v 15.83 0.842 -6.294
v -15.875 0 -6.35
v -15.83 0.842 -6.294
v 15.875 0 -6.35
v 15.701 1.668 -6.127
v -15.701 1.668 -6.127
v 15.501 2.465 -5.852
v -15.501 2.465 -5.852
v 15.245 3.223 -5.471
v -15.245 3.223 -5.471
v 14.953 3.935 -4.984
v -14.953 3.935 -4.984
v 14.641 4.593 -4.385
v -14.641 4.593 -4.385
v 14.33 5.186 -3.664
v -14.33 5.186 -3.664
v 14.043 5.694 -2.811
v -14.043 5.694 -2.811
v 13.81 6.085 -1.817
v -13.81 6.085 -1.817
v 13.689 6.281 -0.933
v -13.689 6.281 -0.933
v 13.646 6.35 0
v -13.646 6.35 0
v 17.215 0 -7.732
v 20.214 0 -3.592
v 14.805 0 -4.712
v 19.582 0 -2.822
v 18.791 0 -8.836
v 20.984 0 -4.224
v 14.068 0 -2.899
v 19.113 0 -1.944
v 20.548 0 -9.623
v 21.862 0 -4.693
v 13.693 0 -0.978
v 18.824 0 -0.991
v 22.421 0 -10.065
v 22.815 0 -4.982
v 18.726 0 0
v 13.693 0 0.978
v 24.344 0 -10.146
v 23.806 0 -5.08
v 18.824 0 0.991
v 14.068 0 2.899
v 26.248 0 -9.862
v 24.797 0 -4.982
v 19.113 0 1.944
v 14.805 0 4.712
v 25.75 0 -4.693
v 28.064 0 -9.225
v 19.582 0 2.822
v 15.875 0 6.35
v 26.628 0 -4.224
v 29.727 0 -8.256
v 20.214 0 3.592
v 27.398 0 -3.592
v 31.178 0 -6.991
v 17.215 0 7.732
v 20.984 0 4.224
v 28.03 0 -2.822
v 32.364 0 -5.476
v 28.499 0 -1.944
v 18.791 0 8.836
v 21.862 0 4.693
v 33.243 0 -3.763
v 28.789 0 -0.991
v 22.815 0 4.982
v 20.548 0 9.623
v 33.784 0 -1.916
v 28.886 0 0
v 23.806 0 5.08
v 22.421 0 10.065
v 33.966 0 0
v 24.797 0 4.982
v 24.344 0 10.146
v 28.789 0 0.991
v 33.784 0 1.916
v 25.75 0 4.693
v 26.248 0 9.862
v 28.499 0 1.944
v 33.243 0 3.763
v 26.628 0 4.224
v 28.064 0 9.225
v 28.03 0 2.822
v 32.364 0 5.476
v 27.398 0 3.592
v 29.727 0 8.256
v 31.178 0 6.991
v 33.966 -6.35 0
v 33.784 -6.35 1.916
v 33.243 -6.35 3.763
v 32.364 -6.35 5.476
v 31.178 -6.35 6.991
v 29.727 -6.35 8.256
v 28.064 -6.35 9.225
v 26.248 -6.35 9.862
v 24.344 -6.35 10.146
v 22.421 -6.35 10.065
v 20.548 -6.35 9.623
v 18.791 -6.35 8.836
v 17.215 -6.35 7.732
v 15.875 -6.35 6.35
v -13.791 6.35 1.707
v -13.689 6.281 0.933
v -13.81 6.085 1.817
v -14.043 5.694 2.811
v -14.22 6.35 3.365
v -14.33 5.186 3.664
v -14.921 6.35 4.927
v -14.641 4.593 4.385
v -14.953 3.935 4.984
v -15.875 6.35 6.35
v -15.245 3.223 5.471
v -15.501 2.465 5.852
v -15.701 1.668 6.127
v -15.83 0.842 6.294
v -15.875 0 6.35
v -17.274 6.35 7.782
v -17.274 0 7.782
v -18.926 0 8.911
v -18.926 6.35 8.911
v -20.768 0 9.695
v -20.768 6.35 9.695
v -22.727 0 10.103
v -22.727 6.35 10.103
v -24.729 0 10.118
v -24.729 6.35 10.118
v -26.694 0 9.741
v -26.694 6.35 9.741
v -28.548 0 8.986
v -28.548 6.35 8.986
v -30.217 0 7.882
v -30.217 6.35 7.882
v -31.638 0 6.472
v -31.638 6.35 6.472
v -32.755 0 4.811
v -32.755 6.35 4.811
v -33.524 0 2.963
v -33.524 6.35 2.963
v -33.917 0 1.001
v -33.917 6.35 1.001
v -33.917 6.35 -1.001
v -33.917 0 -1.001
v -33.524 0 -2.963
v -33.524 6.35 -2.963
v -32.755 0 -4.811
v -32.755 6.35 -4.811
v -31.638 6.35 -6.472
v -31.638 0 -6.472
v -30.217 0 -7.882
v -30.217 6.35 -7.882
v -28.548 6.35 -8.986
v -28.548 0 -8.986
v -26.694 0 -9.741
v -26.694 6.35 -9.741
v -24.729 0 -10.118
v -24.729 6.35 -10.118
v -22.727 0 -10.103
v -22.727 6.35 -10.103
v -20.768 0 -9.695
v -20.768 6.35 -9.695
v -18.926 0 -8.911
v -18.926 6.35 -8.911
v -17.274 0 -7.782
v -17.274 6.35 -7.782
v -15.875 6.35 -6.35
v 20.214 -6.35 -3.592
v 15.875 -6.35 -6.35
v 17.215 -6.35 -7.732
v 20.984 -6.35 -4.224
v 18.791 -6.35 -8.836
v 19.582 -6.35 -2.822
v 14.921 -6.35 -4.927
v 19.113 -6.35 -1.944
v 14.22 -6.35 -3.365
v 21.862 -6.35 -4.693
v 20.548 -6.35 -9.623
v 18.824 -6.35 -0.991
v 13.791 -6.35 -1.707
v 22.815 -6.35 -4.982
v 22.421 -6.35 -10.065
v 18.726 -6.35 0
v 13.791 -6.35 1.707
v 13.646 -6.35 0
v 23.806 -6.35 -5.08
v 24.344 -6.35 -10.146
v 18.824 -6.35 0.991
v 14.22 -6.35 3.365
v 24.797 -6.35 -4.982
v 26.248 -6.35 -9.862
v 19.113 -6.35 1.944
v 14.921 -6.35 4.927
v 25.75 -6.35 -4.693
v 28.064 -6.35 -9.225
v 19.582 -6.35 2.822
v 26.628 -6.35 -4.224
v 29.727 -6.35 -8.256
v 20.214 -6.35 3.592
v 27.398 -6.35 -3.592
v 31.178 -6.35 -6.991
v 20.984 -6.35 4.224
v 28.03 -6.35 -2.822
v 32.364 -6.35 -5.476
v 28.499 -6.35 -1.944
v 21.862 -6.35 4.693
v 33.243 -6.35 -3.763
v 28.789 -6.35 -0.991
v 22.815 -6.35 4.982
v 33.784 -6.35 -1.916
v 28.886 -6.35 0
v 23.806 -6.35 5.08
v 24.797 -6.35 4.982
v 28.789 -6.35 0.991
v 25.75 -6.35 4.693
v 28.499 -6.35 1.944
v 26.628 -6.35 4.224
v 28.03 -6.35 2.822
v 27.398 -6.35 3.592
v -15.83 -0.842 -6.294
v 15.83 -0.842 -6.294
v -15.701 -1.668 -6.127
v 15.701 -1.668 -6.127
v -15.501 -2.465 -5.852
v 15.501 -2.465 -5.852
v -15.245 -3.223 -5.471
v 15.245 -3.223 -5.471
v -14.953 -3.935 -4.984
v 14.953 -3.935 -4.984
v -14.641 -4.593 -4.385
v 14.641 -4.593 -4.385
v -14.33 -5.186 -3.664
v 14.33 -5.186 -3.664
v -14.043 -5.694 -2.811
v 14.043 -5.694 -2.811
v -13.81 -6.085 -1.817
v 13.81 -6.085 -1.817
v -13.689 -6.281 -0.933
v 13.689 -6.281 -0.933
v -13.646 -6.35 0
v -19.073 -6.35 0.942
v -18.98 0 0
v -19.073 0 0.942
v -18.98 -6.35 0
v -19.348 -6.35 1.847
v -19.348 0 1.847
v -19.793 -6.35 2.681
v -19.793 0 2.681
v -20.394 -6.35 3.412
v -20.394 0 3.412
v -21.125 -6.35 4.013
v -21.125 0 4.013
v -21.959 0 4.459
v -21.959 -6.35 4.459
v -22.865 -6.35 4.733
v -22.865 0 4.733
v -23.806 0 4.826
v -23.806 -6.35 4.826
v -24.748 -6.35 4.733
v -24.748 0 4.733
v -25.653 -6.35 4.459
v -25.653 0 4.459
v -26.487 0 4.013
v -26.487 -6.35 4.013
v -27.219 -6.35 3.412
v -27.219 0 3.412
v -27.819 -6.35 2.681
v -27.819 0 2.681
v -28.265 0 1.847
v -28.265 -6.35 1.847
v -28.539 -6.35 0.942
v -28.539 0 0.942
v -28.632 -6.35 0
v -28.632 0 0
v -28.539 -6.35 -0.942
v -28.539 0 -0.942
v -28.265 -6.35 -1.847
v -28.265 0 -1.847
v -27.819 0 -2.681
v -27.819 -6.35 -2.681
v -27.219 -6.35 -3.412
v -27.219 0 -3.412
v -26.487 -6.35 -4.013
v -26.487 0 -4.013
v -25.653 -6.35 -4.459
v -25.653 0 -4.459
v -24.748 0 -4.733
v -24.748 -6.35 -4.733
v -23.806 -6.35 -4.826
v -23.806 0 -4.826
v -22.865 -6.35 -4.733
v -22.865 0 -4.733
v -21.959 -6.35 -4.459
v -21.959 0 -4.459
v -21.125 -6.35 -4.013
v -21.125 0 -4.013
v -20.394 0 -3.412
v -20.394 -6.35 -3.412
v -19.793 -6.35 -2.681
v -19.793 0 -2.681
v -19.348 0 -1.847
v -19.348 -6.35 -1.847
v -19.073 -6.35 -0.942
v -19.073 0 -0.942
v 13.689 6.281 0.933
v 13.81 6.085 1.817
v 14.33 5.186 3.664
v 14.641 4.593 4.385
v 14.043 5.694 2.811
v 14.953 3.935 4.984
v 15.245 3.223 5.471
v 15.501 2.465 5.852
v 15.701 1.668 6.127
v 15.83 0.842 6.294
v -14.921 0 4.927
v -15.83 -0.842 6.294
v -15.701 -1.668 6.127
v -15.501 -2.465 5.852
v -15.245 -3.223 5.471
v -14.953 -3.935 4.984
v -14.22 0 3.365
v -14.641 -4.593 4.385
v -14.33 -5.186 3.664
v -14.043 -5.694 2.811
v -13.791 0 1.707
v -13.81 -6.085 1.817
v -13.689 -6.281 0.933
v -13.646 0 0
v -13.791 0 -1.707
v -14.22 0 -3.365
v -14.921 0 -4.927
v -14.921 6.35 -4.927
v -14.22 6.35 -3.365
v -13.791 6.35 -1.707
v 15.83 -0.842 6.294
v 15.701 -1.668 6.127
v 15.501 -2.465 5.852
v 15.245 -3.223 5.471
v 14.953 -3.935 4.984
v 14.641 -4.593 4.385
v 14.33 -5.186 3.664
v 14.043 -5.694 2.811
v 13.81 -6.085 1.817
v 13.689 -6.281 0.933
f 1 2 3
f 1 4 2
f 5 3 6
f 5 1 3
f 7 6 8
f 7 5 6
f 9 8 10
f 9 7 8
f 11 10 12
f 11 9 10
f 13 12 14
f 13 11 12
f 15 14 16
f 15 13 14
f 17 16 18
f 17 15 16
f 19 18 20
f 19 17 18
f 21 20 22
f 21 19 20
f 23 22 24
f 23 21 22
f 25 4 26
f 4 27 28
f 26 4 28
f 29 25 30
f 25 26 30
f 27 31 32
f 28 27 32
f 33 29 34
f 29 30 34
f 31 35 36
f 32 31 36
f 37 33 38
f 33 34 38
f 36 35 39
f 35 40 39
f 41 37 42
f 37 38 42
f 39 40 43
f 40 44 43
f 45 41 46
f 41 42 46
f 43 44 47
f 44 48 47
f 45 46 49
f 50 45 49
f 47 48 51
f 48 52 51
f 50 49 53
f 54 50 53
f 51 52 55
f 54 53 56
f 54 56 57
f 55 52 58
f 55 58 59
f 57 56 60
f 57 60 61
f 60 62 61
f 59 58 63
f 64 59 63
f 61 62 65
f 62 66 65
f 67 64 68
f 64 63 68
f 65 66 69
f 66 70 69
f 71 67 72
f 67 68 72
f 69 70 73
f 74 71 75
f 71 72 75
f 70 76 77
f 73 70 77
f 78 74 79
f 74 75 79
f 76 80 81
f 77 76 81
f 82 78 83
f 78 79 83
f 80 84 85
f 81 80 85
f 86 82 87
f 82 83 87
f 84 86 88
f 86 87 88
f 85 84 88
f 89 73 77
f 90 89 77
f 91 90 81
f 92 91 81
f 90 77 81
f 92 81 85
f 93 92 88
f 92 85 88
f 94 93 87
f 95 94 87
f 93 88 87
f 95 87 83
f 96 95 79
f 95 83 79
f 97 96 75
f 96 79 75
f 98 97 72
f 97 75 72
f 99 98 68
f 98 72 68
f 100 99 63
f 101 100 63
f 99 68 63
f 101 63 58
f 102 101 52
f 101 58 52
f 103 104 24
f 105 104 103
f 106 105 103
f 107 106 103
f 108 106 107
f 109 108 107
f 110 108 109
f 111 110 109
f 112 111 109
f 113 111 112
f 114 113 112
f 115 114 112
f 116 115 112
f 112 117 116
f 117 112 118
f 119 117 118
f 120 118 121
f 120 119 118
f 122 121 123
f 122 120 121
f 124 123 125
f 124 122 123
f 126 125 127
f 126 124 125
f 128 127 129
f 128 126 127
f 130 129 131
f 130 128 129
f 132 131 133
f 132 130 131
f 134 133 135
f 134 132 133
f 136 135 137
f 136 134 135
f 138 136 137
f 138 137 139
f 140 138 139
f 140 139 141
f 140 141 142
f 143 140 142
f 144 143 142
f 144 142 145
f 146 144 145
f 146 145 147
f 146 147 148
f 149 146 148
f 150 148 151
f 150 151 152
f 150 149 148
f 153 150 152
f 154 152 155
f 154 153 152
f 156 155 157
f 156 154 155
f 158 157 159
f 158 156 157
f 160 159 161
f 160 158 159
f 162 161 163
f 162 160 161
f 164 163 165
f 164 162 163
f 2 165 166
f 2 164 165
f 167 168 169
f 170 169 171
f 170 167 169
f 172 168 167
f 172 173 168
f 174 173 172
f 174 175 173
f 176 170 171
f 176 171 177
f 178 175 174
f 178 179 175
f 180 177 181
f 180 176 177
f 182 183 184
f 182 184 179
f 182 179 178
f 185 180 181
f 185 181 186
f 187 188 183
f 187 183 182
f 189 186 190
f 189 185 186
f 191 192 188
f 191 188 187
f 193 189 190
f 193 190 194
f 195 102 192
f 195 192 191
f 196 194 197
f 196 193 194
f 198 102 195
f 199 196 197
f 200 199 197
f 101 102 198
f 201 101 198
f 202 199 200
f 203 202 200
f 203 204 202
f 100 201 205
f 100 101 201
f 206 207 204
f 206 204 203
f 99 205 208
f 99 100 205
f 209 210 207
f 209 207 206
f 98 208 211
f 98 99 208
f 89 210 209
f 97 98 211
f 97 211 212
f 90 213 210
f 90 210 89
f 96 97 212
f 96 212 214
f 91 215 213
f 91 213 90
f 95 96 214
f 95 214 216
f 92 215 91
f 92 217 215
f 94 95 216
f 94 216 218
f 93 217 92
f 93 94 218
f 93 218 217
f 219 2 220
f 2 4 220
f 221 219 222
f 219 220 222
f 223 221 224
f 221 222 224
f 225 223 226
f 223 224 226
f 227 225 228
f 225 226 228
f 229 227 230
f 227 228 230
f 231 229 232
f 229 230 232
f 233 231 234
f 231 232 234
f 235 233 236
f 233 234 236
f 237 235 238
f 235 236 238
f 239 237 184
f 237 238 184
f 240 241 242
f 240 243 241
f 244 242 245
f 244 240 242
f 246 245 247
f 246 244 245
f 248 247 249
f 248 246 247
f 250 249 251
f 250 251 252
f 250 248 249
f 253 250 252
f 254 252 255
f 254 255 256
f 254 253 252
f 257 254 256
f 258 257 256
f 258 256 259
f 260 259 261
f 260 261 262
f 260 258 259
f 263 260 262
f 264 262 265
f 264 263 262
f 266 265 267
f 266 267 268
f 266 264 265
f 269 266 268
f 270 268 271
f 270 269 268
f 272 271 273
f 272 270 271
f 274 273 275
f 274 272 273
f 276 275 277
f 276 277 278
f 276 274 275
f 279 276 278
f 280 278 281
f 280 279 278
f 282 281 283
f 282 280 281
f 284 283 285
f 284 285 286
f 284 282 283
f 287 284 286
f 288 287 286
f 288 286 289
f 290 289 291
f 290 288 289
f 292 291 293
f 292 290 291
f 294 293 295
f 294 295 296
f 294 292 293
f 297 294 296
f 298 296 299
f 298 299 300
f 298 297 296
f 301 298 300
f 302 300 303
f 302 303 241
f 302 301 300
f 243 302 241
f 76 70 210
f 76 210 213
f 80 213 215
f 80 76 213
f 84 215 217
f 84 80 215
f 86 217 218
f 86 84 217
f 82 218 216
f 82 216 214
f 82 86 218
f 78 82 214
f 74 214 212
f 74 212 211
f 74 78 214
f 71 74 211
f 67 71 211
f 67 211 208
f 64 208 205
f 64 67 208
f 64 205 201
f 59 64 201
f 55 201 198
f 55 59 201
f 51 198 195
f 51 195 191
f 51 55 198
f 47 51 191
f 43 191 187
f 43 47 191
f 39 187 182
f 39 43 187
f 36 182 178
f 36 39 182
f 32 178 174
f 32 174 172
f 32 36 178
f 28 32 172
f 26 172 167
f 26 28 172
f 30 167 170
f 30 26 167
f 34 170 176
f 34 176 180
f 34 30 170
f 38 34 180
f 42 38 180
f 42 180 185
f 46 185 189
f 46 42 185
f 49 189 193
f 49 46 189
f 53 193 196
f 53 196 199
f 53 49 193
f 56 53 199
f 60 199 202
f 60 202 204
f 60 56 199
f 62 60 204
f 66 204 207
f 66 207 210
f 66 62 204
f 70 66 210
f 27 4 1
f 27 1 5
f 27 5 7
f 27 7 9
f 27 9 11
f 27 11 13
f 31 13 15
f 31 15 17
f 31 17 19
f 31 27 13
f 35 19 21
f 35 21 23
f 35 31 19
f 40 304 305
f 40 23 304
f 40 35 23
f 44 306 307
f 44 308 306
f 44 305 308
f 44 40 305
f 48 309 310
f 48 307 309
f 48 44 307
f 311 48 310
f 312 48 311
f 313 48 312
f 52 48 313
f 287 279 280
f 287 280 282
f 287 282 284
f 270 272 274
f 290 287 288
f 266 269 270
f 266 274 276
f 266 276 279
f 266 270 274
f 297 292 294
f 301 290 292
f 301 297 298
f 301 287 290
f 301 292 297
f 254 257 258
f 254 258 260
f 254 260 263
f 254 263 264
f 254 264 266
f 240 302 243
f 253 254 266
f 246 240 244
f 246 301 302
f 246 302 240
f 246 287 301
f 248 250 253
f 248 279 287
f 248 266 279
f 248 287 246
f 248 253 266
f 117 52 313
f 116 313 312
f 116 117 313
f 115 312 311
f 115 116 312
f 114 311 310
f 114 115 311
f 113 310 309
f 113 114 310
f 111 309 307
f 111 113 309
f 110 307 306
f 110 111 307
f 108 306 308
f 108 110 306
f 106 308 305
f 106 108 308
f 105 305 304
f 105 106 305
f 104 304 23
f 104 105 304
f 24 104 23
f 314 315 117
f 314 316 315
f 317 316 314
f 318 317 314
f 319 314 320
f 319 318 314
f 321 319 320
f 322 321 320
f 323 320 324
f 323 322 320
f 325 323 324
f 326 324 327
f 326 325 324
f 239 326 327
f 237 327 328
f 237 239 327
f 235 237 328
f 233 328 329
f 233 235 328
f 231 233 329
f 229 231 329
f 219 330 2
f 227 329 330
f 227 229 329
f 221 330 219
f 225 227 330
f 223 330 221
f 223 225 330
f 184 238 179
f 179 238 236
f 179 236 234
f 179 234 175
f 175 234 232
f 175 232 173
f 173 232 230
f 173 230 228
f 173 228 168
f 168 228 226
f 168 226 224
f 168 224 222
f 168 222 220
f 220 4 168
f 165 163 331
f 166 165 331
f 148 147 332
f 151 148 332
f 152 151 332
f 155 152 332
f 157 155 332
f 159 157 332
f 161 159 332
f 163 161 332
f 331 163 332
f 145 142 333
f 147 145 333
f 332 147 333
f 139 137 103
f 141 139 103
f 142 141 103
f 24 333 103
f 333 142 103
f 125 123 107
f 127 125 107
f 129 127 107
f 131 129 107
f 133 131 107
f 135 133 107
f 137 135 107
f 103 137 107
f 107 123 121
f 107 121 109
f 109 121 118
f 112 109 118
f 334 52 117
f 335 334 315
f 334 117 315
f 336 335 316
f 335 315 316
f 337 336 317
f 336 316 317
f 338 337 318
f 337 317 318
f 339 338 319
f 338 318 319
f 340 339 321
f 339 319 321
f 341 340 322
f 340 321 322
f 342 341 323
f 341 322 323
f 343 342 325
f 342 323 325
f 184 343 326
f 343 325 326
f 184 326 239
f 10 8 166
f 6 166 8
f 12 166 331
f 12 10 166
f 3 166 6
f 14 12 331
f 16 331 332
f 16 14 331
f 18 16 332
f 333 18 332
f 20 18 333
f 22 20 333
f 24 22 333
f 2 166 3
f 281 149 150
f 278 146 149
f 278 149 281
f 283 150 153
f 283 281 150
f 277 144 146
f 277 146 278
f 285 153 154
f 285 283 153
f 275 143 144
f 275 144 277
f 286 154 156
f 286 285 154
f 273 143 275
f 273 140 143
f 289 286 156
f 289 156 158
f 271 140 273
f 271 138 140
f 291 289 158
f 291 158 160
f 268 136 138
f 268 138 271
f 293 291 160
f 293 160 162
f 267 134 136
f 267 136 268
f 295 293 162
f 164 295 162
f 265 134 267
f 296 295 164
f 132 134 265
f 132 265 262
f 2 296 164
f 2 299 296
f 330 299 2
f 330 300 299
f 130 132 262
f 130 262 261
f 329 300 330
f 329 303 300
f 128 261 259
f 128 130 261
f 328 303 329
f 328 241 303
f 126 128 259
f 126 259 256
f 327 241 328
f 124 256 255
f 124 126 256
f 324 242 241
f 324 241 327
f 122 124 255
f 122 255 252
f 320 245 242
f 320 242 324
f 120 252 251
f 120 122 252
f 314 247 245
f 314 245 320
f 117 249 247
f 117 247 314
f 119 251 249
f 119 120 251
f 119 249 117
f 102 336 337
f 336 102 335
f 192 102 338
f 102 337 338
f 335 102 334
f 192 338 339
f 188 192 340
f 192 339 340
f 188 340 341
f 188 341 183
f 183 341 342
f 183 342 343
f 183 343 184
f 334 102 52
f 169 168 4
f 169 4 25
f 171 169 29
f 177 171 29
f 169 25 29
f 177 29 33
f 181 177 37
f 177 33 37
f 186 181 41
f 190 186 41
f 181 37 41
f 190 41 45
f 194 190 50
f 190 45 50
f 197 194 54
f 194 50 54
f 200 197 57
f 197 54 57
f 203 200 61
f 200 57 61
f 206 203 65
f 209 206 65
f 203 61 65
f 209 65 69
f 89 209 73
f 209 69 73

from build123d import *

# Parameters (mm, degrees)
F1_DEPTH = 6.35
F2_R     = 6.3499
F0_R     = 5.08
F3_DEPTH = 6.35
F0_R_2   = 4.826
F4_DEPTH = 6.35
F5_DEPTH = 6.35


# Not quite as in the source:
# - a fillet or chamfer is up to 0.001 mm smaller than in the source, because OpenCascade refuses the exact size


with BuildPart() as f1:
    # F0 (on Front) → F1 (new body, symmetric)
    with BuildSketch(Plane.XZ):
        with BuildLine():
            Line((15.875, 6.35), (-15.875, 6.35))
            ThreePointArc((-15.875, 6.35), (-14.2195407024, 3.3649028089), (-13.646147458, 0))
            ThreePointArc((-13.646147458, 0), (-14.2195407024, -3.3649028089), (-15.875, -6.35))
            Line((-15.875, -6.35), (15.875, -6.35))
            ThreePointArc((15.875, -6.35), (13.646147458, 0), (15.875, 6.35))
        make_face()
    extrude(amount=F1_DEPTH, both=True)

    # F2 (radius 6.35 in the source; OpenCascade refuses exactly that, so slightly less here)
    f2_edges = [f1.edges().sort_by_distance(p)[0] for p in [
        (0, -6.35, 6.35),
        (0, 6.35, 6.35),
        (0, -6.35, -6.35),
        (0, 6.35, -6.35),
    ]]
    fillet(f2_edges, radius=F2_R)

    # F0 (on Front) → F3 (join)
    with BuildSketch(Plane.XZ):
        with BuildLine():
            ThreePointArc((33.966147458, 0), (27.1710502669, 9.5866067556), (15.875, 6.35))
            Line((15.875, 6.35), (15.875, -6.35))
            ThreePointArc((15.875, -6.35), (27.1710502669, -9.5866067556), (33.966147458, 0))
        make_face()
        with Locations((23.806147458, 0)):
            Circle(F0_R, mode=Mode.SUBTRACT)
        with BuildLine():
            Line((15.875, -6.35), (15.875, 6.35))
            ThreePointArc((15.875, 6.35), (13.646147458, 0), (15.875, -6.35))
        make_face()
    extrude(amount=F3_DEPTH)

    # F0 (on Front) → F4 (join)
    with BuildSketch(Plane.XZ):
        with BuildLine():
            Line((-15.875, -6.35), (-15.875, 6.35))
            ThreePointArc((-15.875, 6.35), (-33.966147458, 0), (-15.875, -6.35))
        make_face()
        with Locations((-23.806147458, 0)):
            Circle(F0_R_2, mode=Mode.SUBTRACT)
        with BuildLine():
            ThreePointArc((-13.646147458, 0), (-14.2195407024, 3.3649028089), (-15.875, 6.35))
            Line((-15.875, 6.35), (-15.875, -6.35))
            ThreePointArc((-15.875, -6.35), (-14.2195407024, -3.3649028089), (-13.646147458, 0))
        make_face()
    extrude(amount=-F4_DEPTH)

    # F0 (on Front) → F5 (join, symmetric)
    with BuildSketch(Plane.XZ):
        with Locations((-23.806147458, 0)):
            Circle(F0_R_2)
    extrude(amount=F5_DEPTH, both=True)


solid = f1.part
